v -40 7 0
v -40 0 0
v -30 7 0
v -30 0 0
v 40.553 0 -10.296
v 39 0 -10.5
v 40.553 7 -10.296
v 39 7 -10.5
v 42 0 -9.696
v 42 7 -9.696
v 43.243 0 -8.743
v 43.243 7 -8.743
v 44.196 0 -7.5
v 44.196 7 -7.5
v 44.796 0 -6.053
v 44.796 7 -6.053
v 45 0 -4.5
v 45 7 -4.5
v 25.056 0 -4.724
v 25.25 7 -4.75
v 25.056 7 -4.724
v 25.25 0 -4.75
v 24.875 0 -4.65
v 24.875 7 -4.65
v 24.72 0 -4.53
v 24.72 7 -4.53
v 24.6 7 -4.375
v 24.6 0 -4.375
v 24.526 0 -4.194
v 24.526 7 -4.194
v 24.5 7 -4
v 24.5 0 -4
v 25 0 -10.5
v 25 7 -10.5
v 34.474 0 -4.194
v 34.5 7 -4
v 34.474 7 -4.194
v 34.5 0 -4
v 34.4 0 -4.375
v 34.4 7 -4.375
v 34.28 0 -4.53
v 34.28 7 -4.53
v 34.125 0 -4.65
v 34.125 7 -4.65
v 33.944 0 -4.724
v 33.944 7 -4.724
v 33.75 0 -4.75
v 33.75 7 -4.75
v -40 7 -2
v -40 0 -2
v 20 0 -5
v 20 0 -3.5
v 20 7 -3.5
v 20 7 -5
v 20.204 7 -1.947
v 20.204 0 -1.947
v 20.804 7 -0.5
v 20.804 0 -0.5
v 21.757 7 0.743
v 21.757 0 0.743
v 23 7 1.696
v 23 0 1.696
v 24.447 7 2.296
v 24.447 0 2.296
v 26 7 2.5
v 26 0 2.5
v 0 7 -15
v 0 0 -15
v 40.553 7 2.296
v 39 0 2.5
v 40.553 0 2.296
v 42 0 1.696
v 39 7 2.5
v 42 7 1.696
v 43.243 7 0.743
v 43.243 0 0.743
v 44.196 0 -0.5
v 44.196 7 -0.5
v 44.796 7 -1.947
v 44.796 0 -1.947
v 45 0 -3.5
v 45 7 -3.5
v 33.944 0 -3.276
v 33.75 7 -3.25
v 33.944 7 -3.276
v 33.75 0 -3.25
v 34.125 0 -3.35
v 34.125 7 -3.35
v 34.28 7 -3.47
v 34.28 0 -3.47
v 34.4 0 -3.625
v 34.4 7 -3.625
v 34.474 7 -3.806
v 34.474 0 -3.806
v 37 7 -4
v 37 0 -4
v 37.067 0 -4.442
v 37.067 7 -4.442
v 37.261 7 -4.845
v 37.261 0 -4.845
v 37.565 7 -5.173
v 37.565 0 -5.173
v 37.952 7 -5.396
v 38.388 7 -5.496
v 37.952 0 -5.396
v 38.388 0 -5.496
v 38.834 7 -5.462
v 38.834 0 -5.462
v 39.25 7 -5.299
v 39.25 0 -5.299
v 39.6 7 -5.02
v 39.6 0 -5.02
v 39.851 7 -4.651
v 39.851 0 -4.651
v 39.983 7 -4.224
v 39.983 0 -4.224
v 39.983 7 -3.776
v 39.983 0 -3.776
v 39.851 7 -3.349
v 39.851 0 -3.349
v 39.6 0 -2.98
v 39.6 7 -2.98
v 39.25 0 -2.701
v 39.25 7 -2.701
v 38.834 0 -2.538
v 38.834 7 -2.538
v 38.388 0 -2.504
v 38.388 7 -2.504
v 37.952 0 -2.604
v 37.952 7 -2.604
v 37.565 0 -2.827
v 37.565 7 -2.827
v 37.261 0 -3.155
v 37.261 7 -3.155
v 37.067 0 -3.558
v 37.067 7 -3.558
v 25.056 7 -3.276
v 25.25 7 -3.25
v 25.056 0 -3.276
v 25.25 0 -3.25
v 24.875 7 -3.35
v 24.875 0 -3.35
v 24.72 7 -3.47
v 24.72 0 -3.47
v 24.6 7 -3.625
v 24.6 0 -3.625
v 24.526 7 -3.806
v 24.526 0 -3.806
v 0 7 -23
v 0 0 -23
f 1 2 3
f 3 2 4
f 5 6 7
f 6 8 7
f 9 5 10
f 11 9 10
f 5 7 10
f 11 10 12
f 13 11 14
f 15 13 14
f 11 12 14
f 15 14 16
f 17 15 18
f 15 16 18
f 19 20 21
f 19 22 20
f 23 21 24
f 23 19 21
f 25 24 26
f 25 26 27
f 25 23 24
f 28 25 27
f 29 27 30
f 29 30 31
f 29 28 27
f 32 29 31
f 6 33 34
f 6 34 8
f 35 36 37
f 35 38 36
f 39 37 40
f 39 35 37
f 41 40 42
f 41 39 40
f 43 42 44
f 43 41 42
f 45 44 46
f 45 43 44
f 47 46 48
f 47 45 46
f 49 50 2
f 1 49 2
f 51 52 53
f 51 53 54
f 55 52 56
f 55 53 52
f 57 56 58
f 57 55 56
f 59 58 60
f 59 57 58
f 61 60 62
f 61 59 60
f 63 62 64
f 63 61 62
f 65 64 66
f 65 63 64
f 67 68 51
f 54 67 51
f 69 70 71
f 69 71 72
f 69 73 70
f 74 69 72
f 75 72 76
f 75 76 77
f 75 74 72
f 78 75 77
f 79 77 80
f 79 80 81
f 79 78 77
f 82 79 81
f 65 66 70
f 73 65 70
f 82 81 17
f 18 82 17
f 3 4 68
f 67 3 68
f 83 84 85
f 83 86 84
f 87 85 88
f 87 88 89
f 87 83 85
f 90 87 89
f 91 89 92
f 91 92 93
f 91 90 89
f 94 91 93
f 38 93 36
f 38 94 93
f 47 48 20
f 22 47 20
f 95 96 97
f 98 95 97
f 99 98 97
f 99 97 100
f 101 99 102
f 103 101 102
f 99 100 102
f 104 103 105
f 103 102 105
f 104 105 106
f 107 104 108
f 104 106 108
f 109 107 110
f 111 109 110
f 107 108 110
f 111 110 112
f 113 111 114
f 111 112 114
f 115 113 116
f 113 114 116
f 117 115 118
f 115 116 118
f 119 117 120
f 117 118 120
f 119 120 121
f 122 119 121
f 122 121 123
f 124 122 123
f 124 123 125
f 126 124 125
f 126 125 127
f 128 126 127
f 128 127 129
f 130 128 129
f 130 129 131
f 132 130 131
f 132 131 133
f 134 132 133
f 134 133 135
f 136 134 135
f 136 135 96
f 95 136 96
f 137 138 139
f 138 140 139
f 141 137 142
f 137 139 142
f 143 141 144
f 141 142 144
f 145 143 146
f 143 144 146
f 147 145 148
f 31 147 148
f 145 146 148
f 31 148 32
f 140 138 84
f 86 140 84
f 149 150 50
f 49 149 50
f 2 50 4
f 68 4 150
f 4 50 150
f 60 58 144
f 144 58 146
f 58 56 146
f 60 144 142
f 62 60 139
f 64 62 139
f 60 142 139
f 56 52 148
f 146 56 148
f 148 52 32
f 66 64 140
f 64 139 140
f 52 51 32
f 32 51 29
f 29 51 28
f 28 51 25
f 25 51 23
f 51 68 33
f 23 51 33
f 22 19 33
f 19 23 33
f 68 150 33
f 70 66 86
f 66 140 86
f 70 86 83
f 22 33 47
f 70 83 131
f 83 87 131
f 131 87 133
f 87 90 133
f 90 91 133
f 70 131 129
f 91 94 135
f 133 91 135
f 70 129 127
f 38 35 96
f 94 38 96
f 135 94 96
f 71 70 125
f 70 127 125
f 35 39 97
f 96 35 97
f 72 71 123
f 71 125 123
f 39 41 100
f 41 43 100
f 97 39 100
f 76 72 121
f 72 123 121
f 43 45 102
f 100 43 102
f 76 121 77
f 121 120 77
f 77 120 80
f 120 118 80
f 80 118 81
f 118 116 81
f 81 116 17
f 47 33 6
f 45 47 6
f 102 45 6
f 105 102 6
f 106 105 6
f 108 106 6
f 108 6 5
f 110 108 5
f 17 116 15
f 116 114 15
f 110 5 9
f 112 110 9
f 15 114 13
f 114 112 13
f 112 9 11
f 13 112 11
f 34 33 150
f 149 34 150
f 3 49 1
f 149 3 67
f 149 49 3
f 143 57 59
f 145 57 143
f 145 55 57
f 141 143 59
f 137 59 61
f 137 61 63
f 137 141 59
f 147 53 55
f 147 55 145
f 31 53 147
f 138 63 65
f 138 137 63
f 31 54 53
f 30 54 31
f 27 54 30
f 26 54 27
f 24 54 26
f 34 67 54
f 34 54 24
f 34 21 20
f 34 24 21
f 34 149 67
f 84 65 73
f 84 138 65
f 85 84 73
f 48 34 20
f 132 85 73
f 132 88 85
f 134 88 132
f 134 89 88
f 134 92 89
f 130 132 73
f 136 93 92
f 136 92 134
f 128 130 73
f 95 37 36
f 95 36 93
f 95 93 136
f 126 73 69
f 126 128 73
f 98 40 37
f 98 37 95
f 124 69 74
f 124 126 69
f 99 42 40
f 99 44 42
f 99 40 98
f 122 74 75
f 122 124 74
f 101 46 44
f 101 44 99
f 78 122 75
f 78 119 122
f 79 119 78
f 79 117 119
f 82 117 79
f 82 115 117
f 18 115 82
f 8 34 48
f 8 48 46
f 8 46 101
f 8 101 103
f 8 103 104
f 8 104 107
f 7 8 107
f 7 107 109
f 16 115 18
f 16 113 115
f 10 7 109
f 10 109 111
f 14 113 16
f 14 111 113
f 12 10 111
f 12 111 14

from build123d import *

# Parameters (mm, degrees)
SKETCH1_W                = 25
SKETCH1_H                = 13
BOSS_EXTRUDE1_DEPTH      = 7
F_3_0_3_DIAMETER_HOLE3_D = 3
FILLET7_R                = 6
CUT_EXTRUDE1_DEPTH       = 52.019604075
FILLET8_R                = 0.75


with BuildPart() as part:
    # Sketch1 → Boss-Extrude1 (new body)
    with BuildSketch(Plane(origin=(0, 0, 0), x_dir=(1, 0, 0), z_dir=(0, 1, 0))):
        Polygon((-40, 0), (-30, 0), (0, 15), (20, 5), (20, 10.5), (25, 10.5), (0, 23), (-40, 2), align=None)
        with Locations((32.5, 4)):
            Rectangle(SKETCH1_W, SKETCH1_H)
    extrude(amount=BOSS_EXTRUDE1_DEPTH)

    # Ø3.0 (3) Diameter Hole3 (through all)
    with Locations(Plane(origin=(0, 7, 0), x_dir=(1, 0, 0), z_dir=(0, 1, 0))):
        with Locations((38.5, 4)):
            Hole(F_3_0_3_DIAMETER_HOLE3_D / 2)

    # Fillet7
    fillet7_edges = [part.edges().sort_by_distance(p)[0] for p in [
        (20, 3.5, 2.5),
        (45, 3.5, 2.5),
        (45, 3.5, -10.5),
    ]]
    fillet(fillet7_edges, radius=FILLET7_R)

    # Sketch11 → Cut-Extrude1 (cut, through all)
    with BuildSketch(Plane(origin=(0, 7, 0), x_dir=(1, 0, 0), z_dir=(0, 1, 0))):
        Polygon((24.5, 4), (24.5, 3.25), (34.5, 3.25), (34.5, 4.75), (24.5, 4.75), align=None)
    extrude(amount=-CUT_EXTRUDE1_DEPTH, mode=Mode.SUBTRACT)

    # Fillet8
    fillet8_edges = [part.edges().sort_by_distance(p)[0] for p in [
        (34.5, 3.5, -3.25),
        (34.5, 3.5, -4.75),
        (24.5, 3.5, -4.75),
        (24.5, 3.5, -3.25),
    ]]
    fillet(fillet8_edges, radius=FILLET8_R - 0.0001)  # a hair under: the kernel refuses the full size


solid = part.part
